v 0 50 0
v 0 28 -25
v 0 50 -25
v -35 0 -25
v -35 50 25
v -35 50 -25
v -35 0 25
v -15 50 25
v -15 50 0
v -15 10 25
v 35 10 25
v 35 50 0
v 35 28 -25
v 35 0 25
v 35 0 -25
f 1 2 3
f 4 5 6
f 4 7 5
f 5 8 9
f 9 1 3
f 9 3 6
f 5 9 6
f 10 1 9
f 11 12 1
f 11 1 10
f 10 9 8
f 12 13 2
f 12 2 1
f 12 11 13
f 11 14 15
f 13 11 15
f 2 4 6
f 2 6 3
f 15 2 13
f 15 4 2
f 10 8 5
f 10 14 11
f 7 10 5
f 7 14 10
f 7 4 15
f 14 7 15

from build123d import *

# Parameters (mm, degrees)
SKETCH1_W           = 70
SKETCH1_H           = 50
BOSS_EXTRUDE1_DEPTH = 10
BOSS_EXTRUDE2_DEPTH = 40
BOSS_EXTRUDE3_DEPTH = 50


with BuildPart() as part:
    # Sketch1 → Boss-Extrude1 (new body)
    with BuildSketch(Plane(origin=(0, 0, 0), x_dir=(1, 0, 0), z_dir=(0, 1, 0))):
        Rectangle(SKETCH1_W, SKETCH1_H)
    extrude(amount=BOSS_EXTRUDE1_DEPTH)

    # Sketch3 → Boss-Extrude2 (add)
    with BuildSketch(Plane(origin=(0, 10, 0), x_dir=(1, 0, 0), z_dir=(0, 1, 0))):
        Polygon((-35, 25), (0, 25), (0, 0), (-15, 0), (-15, -25), (-35, -25), align=None)
    extrude(amount=BOSS_EXTRUDE2_DEPTH)

    # Sketch4 → Boss-Extrude3 (add)
    with BuildSketch(Plane(origin=(35, 0, 0), x_dir=(0, 0, -1), z_dir=(1, 0, 0))):
        Polygon((25, 10), (25, 28), (0, 50), (-25, 10), align=None)
    extrude(amount=-BOSS_EXTRUDE3_DEPTH)


solid = part.part
